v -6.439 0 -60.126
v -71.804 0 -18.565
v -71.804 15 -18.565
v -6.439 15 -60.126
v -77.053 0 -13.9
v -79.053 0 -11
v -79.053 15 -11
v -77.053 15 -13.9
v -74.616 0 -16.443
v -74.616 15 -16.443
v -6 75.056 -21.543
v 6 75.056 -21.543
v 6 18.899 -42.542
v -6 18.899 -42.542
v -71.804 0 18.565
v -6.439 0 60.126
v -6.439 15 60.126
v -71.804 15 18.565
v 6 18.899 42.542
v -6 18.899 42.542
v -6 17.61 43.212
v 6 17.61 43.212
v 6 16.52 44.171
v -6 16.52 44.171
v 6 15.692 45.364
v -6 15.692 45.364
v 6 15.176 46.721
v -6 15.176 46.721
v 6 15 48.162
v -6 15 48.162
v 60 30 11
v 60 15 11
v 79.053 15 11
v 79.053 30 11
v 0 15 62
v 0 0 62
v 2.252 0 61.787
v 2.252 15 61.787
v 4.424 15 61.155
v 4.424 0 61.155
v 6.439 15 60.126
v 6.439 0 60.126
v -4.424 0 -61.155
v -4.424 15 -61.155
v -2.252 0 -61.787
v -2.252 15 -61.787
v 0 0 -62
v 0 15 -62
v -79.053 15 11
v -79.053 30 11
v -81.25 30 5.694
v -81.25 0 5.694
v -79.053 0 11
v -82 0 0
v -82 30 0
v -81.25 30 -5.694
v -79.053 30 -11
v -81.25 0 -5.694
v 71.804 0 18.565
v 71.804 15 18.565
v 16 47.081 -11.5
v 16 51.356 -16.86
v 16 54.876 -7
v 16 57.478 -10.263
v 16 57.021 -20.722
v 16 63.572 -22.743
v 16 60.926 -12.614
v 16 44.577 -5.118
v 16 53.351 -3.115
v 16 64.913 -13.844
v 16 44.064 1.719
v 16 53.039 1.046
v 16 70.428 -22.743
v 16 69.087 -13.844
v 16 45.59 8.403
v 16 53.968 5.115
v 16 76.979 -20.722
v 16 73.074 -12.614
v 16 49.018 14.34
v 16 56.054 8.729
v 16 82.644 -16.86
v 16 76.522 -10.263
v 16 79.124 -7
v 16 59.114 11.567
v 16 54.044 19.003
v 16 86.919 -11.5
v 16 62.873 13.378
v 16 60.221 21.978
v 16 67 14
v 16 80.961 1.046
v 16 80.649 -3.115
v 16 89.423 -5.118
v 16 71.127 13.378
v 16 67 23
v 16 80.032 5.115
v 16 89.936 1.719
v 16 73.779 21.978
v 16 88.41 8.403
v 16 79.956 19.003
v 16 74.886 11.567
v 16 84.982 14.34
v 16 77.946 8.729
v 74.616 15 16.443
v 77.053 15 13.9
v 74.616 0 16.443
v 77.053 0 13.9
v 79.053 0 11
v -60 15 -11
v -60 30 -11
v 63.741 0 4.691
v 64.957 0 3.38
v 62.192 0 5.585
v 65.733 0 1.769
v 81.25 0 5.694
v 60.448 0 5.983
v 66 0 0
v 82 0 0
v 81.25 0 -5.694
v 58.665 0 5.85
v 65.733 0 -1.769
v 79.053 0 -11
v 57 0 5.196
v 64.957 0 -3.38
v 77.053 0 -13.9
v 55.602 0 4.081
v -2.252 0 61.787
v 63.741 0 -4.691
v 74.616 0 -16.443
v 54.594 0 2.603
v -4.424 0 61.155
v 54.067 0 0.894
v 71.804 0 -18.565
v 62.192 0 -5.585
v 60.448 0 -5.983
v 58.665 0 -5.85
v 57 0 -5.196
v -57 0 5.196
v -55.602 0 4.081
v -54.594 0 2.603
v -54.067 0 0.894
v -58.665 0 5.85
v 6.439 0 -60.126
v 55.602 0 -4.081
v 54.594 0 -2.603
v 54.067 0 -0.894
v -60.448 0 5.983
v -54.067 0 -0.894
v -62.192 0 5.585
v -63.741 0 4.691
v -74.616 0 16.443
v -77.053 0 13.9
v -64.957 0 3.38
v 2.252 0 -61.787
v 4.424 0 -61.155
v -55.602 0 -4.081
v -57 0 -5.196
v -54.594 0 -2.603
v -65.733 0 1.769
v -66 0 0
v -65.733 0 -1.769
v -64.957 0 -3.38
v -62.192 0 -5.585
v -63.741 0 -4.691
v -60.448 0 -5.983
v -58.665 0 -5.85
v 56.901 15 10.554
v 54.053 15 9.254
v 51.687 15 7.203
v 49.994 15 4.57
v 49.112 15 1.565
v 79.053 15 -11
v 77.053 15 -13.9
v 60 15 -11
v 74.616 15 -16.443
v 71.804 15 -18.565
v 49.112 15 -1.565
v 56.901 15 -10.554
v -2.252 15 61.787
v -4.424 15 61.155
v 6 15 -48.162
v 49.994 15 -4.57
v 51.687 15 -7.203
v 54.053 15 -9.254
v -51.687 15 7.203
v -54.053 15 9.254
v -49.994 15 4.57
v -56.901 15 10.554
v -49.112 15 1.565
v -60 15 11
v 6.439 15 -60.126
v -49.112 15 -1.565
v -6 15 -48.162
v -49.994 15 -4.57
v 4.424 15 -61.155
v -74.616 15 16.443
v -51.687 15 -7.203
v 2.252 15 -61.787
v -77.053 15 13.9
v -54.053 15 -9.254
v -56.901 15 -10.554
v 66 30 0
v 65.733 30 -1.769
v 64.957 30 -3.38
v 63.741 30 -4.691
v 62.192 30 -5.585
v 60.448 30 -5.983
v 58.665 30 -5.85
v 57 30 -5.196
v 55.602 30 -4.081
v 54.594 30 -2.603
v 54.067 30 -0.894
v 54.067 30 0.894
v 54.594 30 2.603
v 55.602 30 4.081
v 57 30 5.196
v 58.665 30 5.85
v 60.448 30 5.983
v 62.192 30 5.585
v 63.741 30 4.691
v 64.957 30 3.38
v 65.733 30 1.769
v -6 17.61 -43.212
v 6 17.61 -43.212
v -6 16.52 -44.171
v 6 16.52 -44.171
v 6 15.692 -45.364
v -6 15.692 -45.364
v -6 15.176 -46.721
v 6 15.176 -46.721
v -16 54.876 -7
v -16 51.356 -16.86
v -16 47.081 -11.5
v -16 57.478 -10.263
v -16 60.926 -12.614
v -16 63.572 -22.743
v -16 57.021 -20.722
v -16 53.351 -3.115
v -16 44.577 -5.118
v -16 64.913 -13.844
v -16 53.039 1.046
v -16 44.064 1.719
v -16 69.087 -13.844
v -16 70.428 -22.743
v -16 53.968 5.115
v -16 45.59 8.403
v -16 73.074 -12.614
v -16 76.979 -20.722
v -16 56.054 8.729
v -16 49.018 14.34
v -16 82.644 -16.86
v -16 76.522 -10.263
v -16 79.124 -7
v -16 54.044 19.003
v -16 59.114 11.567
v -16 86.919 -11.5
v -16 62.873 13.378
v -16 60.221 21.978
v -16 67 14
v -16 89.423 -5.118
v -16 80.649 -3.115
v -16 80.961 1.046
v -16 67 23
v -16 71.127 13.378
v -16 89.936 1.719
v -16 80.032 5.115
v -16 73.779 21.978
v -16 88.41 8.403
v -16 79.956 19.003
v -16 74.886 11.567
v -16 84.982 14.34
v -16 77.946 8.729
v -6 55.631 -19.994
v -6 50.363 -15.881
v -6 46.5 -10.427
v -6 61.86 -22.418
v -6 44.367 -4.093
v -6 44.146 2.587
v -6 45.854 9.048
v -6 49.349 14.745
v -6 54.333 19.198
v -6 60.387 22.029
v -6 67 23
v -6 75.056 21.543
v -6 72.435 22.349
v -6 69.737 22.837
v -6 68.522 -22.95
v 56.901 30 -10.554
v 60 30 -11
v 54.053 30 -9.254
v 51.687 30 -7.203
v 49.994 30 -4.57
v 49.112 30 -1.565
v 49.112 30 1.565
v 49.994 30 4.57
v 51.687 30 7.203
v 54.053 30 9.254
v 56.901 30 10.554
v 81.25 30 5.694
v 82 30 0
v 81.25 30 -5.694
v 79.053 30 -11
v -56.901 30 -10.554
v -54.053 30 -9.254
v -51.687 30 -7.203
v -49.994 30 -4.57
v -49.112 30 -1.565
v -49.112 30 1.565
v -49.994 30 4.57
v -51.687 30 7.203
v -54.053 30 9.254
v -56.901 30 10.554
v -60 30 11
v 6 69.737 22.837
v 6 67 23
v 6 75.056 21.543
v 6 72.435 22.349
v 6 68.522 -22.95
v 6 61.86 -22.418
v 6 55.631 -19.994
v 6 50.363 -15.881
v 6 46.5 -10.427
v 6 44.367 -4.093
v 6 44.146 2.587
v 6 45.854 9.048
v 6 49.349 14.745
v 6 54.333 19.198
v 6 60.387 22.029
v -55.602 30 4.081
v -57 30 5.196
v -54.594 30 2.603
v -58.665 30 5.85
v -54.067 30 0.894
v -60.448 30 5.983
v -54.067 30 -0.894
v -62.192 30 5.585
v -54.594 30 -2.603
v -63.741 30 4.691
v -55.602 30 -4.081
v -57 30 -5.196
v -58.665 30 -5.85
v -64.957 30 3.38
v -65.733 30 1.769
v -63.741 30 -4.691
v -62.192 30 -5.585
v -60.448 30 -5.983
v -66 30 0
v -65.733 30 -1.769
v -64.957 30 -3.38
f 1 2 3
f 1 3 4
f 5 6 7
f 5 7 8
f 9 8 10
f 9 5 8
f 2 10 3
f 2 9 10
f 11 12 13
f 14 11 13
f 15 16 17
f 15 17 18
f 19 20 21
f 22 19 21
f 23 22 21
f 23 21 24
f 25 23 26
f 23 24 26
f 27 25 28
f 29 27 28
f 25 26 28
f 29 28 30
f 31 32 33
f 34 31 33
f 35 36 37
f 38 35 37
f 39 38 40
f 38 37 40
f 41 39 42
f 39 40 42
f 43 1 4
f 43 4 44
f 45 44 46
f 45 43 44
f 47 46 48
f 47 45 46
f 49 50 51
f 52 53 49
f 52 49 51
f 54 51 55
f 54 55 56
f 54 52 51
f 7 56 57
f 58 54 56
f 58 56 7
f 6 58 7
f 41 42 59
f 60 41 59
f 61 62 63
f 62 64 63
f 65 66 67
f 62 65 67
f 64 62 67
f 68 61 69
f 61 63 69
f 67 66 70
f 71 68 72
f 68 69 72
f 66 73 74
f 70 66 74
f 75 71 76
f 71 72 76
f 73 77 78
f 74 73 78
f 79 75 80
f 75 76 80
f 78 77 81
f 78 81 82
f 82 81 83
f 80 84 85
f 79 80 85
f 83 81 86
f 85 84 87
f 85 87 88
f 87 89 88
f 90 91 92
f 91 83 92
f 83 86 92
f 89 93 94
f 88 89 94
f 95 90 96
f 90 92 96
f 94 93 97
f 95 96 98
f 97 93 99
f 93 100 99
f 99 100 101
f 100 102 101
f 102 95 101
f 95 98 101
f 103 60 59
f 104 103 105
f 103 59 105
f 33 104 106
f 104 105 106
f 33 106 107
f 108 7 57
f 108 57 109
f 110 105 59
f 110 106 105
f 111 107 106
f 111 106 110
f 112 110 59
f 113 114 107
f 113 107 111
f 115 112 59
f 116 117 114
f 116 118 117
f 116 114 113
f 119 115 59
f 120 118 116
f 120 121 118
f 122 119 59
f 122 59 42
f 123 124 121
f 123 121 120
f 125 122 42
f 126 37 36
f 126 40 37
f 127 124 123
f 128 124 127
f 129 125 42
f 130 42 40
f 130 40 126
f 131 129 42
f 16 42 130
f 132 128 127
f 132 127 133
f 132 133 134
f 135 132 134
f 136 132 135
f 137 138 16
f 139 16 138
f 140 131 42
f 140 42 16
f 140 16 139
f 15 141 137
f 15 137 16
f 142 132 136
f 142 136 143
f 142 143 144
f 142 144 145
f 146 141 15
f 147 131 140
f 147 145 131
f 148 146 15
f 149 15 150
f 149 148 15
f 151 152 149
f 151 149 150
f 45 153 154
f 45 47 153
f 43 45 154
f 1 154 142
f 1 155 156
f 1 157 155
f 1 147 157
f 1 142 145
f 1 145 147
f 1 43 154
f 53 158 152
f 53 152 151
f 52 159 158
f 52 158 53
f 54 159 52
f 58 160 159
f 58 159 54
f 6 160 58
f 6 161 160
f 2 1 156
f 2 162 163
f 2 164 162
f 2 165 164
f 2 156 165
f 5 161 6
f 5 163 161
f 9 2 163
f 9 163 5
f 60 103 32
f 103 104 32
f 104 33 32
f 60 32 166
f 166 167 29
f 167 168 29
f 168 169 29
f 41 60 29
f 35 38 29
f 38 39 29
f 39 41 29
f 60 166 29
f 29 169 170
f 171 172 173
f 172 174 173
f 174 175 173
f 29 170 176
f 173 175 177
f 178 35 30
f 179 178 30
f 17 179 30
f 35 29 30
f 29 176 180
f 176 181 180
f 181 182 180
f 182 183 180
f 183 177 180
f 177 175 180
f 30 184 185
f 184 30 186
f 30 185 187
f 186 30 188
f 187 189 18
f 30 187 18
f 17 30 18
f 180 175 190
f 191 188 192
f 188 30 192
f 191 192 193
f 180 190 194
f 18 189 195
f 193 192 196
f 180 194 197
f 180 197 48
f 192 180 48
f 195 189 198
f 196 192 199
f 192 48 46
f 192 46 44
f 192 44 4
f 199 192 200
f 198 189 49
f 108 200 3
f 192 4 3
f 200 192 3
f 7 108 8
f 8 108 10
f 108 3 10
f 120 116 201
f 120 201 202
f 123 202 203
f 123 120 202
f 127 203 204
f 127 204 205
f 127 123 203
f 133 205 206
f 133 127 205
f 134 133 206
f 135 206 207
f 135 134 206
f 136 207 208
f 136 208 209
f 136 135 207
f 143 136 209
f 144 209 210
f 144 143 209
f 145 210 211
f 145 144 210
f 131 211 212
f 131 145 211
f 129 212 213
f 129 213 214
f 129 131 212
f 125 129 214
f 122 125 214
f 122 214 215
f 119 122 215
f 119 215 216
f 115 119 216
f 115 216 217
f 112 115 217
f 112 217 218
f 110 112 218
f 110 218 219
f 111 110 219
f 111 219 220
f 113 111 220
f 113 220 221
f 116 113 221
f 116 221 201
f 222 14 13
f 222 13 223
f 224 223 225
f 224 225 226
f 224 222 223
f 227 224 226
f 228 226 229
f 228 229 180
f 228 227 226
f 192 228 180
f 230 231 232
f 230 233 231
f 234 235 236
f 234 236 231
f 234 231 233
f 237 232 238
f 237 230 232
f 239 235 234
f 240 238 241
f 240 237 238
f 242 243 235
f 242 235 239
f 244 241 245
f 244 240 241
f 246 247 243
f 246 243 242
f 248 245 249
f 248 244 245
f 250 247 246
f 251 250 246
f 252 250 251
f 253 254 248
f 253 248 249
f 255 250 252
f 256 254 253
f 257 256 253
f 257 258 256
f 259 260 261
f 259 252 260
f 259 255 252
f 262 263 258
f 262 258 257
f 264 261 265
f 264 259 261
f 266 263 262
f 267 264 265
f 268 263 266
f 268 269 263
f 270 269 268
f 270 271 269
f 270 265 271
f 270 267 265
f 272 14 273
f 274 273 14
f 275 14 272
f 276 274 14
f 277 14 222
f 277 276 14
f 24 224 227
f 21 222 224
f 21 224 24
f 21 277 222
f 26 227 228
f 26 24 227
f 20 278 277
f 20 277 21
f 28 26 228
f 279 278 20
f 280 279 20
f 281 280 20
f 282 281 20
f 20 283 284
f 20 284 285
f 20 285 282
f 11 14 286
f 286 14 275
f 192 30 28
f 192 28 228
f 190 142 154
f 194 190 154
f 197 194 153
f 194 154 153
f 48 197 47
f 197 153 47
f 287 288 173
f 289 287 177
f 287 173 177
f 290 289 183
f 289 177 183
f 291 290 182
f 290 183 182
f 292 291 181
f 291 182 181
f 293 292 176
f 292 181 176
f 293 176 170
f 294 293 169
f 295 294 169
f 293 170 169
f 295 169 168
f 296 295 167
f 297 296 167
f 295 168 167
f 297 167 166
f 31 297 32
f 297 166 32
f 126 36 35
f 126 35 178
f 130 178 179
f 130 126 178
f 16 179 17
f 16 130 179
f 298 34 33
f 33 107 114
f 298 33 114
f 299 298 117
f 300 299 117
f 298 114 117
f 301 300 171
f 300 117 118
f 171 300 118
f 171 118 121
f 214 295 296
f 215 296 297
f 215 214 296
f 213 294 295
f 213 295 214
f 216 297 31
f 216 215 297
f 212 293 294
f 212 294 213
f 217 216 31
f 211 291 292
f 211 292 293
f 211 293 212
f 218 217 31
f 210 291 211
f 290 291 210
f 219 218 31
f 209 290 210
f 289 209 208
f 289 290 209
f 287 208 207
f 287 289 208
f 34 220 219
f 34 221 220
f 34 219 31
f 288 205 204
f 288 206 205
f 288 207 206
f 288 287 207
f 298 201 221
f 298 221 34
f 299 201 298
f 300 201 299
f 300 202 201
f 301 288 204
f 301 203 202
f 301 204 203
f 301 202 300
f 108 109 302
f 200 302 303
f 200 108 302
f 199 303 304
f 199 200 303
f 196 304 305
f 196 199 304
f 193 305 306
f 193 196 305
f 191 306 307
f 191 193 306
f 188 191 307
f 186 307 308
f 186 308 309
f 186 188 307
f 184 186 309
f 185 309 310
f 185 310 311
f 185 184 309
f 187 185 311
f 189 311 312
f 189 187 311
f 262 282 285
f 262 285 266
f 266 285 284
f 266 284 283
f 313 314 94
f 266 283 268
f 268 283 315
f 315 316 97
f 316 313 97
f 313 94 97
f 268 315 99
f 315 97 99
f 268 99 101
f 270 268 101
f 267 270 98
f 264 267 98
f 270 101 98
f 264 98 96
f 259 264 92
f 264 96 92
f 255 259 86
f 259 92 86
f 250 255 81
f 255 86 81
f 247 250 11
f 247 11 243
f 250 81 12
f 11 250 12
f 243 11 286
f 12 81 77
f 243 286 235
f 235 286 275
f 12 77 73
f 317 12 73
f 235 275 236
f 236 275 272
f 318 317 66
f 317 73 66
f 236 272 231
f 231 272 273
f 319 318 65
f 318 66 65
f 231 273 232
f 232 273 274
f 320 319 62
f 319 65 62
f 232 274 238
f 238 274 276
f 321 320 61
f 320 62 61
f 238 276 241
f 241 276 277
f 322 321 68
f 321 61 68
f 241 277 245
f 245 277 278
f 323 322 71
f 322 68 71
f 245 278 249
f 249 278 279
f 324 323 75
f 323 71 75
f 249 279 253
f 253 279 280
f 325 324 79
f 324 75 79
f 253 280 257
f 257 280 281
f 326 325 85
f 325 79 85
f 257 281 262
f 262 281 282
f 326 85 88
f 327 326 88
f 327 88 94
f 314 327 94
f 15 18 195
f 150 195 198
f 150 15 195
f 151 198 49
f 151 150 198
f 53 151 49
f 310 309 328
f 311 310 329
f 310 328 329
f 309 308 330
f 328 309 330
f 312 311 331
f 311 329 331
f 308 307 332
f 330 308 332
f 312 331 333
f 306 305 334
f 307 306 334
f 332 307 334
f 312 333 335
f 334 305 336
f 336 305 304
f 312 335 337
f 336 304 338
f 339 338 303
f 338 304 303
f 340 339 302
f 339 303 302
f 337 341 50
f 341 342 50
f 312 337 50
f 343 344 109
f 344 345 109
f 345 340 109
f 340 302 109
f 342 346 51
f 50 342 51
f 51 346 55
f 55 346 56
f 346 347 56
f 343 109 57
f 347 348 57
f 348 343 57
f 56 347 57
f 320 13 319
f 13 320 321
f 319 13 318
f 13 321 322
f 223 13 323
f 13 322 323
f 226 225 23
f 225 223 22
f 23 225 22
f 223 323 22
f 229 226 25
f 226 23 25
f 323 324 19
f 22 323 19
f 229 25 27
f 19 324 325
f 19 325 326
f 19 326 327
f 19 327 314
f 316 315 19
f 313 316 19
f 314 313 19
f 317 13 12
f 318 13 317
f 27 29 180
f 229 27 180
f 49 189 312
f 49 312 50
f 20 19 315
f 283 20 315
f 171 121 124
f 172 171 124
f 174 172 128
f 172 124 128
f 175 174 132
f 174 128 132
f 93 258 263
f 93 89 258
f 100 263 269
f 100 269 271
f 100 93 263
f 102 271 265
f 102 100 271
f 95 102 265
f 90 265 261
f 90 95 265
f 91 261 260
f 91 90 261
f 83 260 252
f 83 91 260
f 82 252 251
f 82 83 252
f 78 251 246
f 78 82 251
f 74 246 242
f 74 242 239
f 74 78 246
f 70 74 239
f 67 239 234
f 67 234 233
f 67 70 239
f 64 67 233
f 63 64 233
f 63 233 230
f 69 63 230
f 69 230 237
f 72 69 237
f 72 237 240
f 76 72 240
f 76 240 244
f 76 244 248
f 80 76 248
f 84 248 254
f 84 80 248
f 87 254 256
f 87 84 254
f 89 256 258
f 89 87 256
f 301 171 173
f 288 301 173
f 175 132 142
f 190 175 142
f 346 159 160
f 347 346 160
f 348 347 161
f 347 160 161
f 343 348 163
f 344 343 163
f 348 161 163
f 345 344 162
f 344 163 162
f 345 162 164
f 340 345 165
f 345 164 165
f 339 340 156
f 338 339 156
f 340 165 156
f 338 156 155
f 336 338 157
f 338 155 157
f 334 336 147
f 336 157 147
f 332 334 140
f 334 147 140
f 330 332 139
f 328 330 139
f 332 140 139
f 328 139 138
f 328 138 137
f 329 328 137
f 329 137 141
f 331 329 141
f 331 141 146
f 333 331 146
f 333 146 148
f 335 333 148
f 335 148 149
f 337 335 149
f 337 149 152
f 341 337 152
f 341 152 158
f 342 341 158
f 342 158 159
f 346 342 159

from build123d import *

# Parameters (mm, degrees)
SKETCH1_R           = 6
BOSS_EXTRUDE1_DEPTH = 30
BOSS_EXTRUDE2_DEPTH = 15
BOSS_EXTRUDE3_DEPTH = 6
SKETCH2_3_R         = 14
BOSS_EXTRUDE4_DEPTH = 16
FILLET1_R           = 6


with BuildPart() as part:
    # Sketch1 → Boss-Extrude1 (new body)
    with BuildSketch(Plane(origin=(0, 0, 0), x_dir=(1, 0, 0), z_dir=(0, 1, 0))):
        with BuildLine():
            ThreePointArc((60, 11), (49, 0), (60, -11))
            Line((60, -11), (79.052558883, -11))
            ThreePointArc((79.052558883, -11), (82, 0), (79.052558883, 11))
            Line((79.052558883, 11), (60, 11))
        make_face()
        with Locations((60, 0)):
            Circle(SKETCH1_R, mode=Mode.SUBTRACT)
    extrude(amount=BOSS_EXTRUDE1_DEPTH)

    # Sketch1<3> → Boss-Extrude2 (add)
    with BuildSketch(Plane(origin=(0, 0, 0), x_dir=(1, 0, 0), z_dir=(0, 1, 0))):
        with BuildLine():
            ThreePointArc((6.438655763, 60.126386916), (3.352861242, 61.522079738), (0, 62))
            Line((0, 62), (0, -62))
            ThreePointArc((0, -62), (3.352861242, -61.522079738), (6.438655763, -60.126386916))
            Line((6.438655763, -60.126386916), (71.804202232, -18.565042679))
            ThreePointArc((71.804202232, -18.565042679), (75.885288613, -15.220302418), (79.052558883, -11))
            Line((79.052558883, -11), (60, -11))
            ThreePointArc((60, -11), (49, 0), (60, 11))
            Line((60, 11), (79.052558883, 11))
            ThreePointArc((79.052558883, 11), (75.885288613, 15.220302418), (71.804202232, 18.565042679))
            Line((71.804202232, 18.565042679), (6.438655763, 60.126386916))
        make_face()
    extrude(amount=BOSS_EXTRUDE2_DEPTH)

    # Sketch2 → Boss-Extrude3 (add)
    with BuildSketch(Plane.ZY):
        with BuildLine():
            Line((-44, 15), (44, 15))
            Line((44, 15), (21.543109519, 75.055708054))
            ThreePointArc((21.543109519, 75.055708054), (0, 44), (-21.543109519, 75.055708054))
            Line((-21.543109519, 75.055708054), (-44, 15))
        make_face()
    extrude(amount=-BOSS_EXTRUDE3_DEPTH)

    # Sketch2<3> → Boss-Extrude4 (add)
    with BuildSketch(Plane.ZY):
        with BuildLine():
            ThreePointArc((23, 67), (22.632846915, 71.093194417), (21.543109519, 75.055708054))
            ThreePointArc((21.543109519, 75.055708054), (0, 90), (-21.543109519, 75.055708054))
            ThreePointArc((-21.543109519, 75.055708054), (-4.093194417, 44.367153085), (23, 67))
        make_face()
        with Locations((0, 67)):
            Circle(SKETCH2_3_R, mode=Mode.SUBTRACT)
    extrude(amount=-BOSS_EXTRUDE4_DEPTH)

    # Fillet1
    fillet1_edges = [part.edges().sort_by_distance(p)[0] for p in [
        (3, 15, -44),
        (3, 15, 44),
    ]]
    fillet(fillet1_edges, radius=FILLET1_R)

    # Mirror1: part across plane


with BuildPart() as part_1:
    add(part.part)
    add(part.part.mirror(Plane(origin=(0, 15, 0), x_dir=(0, 0, 1), z_dir=(1, 0, 0))))


solid = part_1.part
